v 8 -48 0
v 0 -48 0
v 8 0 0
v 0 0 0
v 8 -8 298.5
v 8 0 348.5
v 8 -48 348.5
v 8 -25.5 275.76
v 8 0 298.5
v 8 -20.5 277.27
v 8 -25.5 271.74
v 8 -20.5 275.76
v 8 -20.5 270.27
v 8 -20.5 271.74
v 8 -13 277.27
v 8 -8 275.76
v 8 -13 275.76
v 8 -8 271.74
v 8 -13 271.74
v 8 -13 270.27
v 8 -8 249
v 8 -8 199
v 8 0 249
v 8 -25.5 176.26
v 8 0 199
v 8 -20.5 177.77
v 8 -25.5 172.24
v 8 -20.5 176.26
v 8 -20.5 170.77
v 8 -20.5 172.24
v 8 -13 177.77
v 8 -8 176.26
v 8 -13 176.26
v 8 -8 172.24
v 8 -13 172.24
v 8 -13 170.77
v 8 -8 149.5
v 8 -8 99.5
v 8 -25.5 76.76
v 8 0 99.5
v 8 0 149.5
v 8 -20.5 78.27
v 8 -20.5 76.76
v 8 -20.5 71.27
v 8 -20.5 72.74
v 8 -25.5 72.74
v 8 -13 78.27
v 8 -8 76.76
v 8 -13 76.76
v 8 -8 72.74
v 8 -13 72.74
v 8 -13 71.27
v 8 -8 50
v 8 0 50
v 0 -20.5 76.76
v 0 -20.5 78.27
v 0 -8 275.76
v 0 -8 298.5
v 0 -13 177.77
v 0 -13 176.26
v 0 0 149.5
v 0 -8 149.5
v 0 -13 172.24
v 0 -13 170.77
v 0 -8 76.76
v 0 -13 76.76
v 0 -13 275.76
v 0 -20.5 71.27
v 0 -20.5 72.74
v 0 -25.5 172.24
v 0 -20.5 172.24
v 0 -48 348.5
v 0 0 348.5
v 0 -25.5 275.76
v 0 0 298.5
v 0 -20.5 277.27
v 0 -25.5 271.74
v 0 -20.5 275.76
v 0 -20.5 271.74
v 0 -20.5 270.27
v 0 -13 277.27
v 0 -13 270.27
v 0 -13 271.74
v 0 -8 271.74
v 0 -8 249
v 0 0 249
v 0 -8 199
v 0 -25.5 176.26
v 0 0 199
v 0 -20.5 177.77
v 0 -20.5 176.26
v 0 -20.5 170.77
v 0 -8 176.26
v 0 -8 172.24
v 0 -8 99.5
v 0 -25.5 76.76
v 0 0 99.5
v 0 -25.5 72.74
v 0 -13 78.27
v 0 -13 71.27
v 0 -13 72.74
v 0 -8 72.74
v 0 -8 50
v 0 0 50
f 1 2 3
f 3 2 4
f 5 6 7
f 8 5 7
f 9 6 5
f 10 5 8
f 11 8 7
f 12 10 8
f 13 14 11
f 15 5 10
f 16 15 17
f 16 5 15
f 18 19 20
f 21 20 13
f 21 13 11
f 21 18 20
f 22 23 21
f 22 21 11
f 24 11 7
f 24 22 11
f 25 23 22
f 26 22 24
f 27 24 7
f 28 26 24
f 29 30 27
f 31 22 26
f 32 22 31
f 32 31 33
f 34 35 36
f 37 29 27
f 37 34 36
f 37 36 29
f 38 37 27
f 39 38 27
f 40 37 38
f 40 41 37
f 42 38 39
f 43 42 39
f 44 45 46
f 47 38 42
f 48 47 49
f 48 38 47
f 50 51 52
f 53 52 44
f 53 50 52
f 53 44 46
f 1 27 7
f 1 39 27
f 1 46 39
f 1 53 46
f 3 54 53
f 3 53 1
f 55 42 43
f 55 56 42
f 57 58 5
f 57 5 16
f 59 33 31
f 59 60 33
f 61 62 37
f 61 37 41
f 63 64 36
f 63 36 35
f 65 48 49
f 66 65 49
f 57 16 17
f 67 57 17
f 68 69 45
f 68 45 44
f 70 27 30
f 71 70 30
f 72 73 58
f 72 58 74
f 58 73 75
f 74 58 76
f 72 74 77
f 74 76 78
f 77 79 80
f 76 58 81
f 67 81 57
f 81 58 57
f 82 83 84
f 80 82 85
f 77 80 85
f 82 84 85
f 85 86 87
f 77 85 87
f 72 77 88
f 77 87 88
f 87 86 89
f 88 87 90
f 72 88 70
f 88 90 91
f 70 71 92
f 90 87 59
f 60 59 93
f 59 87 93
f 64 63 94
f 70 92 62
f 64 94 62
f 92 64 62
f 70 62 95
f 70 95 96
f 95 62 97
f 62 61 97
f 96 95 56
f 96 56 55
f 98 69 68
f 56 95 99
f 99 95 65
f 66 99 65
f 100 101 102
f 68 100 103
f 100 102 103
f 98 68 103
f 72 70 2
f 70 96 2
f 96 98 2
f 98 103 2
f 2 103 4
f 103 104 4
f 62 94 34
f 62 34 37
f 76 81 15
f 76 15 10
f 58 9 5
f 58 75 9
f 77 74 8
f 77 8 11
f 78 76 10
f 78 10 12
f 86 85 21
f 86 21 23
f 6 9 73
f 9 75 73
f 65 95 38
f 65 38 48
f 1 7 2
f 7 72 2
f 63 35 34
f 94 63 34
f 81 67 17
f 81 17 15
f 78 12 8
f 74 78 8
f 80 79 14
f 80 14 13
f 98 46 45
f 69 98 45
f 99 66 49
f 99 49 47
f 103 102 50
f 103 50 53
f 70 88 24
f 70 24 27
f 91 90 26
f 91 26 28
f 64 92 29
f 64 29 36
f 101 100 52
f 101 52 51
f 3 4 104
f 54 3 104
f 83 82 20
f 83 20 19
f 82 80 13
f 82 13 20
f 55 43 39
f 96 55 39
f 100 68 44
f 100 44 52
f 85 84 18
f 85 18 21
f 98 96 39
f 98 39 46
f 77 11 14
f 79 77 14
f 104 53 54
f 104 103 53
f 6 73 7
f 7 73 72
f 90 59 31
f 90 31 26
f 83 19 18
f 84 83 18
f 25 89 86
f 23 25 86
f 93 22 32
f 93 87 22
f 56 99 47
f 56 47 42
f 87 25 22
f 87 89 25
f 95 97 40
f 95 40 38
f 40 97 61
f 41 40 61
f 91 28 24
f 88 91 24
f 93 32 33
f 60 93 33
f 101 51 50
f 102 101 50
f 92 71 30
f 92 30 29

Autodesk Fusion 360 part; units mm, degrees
sketch "Basic shape" plane through (0, 0, 0) normal (1, 0, 0) x (0, 0, -1)
  line L0 (0, 0) -> (-348.5, 0)
  line L1 (-348.5, 0) -> (-348.5, -48)
  line L2 (-348.5, -48) -> (0, -48)
  line L3 (0, -48) -> (0, 0)
  line L4 (-50, 0) -> (-99.5, 0)
  line L5 (-99.5, 0) -> (-99.5, -8)
  line L6 (-99.5, -8) -> (-50, -8)
  line L7 (-50, -8) -> (-50, 0)
  line L8 (-149.5, 0) -> (-199, 0)
  line L9 (-199, 0) -> (-199, -8)
  line L10 (-199, -8) -> (-149.5, -8)
  line L11 (-149.5, -8) -> (-149.5, 0)
  line L12 (-249, 0) -> (-298.5, 0)
  line L13 (-298.5, 0) -> (-298.5, -8)
  line L14 (-298.5, -8) -> (-249, -8)
  line L15 (-249, -8) -> (-249, 0)
  line L16 (-298.5, -8) -> (-348.5, -8) construction
  line L17 (-199, -8) -> (-249, -8) construction
  line L18 (-99.5, -8) -> (-149.5, -8) construction
  line L19 (-50, -8) -> (0, -8) construction
  dimension "d10" = 50
  dimension "d12" = 8
  dimension "d13" = 348.5
  dimension "d14" = 36.1667
  dimension "d246" = 40
extrude "Extrude1" add sketch "Basic shape" along normal blind 8 contours L0 L1 L2 L3 L5 L6 L7 L9 L10 L11 L13 L14 L15
sketch "T slots" plane through (0, 0, 0) normal (-1, 0, 0) x (0, 0, 1)
  line L0 (348.5, 0) -> (298.5, 0)
  line L1 (298.5, 0) -> (298.5, -8)
  line L2 (298.5, -8) -> (249, -8)
  line L3 (249, -8) -> (249, 0)
  line L4 (249, 0) -> (199, 0)
  line L5 (199, 0) -> (199, -8)
  line L6 (199, -8) -> (149.5, -8)
  line L7 (149.5, -8) -> (149.5, 0)
  line L8 (149.5, 0) -> (99.5, 0)
  line L9 (99.5, 0) -> (99.5, -8)
  line L10 (99.5, -8) -> (50, -8)
  line L11 (50, -8) -> (50, 0)
  line L12 (50, 0) -> (0, 0)
  line L13 (0, 0) -> (0, -48)
  line L14 (0, -48) -> (348.5, -48)
  line L15 (348.5, -48) -> (348.5, 0)
  line L16 (72.74, -8) -> (76.76, -8)
  line L17 (76.76, -8) -> (76.76, -25.5)
  line L18 (76.76, -25.5) -> (72.74, -25.5)
  line L19 (72.74, -25.5) -> (72.74, -8)
  line L20 (71.27, -13) -> (78.27, -13)
  line L21 (78.27, -13) -> (78.27, -20.5)
  line L22 (78.27, -20.5) -> (71.27, -20.5)
  line L23 (71.27, -20.5) -> (71.27, -13)
  line L24 (170.77, -20.5) -> (170.77, -13)
  line L25 (172.24, -8) -> (176.26, -8)
  line L26 (170.77, -13) -> (177.77, -13)
  line L27 (172.24, -25.5) -> (172.24, -8)
  line L28 (176.26, -8) -> (176.26, -25.5)
  line L29 (177.77, -20.5) -> (170.77, -20.5)
  line L30 (177.77, -13) -> (177.77, -20.5)
  line L31 (176.26, -25.5) -> (172.24, -25.5)
  line L32 (277.27, -20.5) -> (270.27, -20.5)
  line L33 (270.27, -13) -> (277.27, -13)
  line L34 (275.76, -8) -> (275.76, -25.5)
  line L35 (271.74, -25.5) -> (271.74, -8)
  line L36 (275.76, -25.5) -> (271.74, -25.5)
  line L37 (271.74, -8) -> (275.76, -8)
  line L38 (277.27, -13) -> (277.27, -20.5)
  line L39 (270.27, -20.5) -> (270.27, -13)
  circle A0 centre (275.27, -15) radius 2
  circle A1 centre (275.27, -18.5) radius 2
  dimension "d17" = 17.5
  dimension "d18" = 4.02
  dimension "d19" = 7
  dimension "d20" = 1.51
  dimension "d21" = 5
  dimension "d23" = 7.5
  dimension "d29" = 2.01
  dimension "d247" = 17.5
  dimension "d248" = 4.02
  dimension "d249" = 7
  dimension "d250" = 1.51
  dimension "d251" = 5
  dimension "d252" = 7.5
  dimension "d253" = 2.01
  dimension "d254" = 17.5
  dimension "d255" = 4.02
  dimension "d256" = 7
  dimension "d257" = 1.51
  dimension "d258" = 5
  dimension "d259" = 7.5
  dimension "d260" = 2.01
  dimension "d357" = 4
  dimension "d358" = 4
extrude "Extrude2" cut sketch "T slots" against normal through all contours L2 L33 L34 L35 L37 | L33 L34 A0 | L33 L34 L38 A0 | L32 L33 L35 L39 | L32 L33 L35 A0 A1 | L34 A0 A1 | L34 A0 A1 | L32 L34 L35 L36 | L34 A0 A1 | L34 A0 A1 | L38 A0 A1 | L34 A0 A1 | L10 L16 L17 L19 L20 | L32 L34 A1 | L34 A0 A1 | L32 L34 L38 A1 | L17 L19 L20 L22 | L19 L20 L22 L23 | L17 L20 L21 L22 | L17 L18 L19 L22 | L6 L25 L26 L27 L28 | L26 L27 L28 L29 | L26 L28 L29 L30 | L24 L26 L27 L29 | L27 L28 L29 L31
hole "Hole24" at (8, -6.5858, 297.0858) direction (-1, 0, 0) diameter 4 end up to surface (8 mm away)
hole "Hole25" at (8, -6.5858, 51.4142) direction (-1, 0, 0) diameter 4 end up to surface (8 mm away)
hole "Hole26" at (8, -6.5858, 98.0858) direction (-1, 0, 0) diameter 4 end up to surface (8 mm away)
hole "Hole27" at (8, -6.5858, 197.5858) direction (-1, 0, 0) diameter 4 end up to surface (8 mm away)
hole "Hole28" at (8, -6.5858, 250.4142) direction (-1, 0, 0) diameter 4 end up to surface (8 mm away)
hole "Hole29" at (8, -6.5858, 150.9142) direction (-1, 0, 0) diameter 4 end up to surface (8 mm away)
equation "d10 = Square_joint_thickness"
equation "pannel_thickness = 8 mm"
equation "d12 = pannel_thickness * 3 / 3"
equation "d15 = pannel_thickness"
equation "d20 = ( ( ( 7 - 4 ) / 2 ) * 1 mm ) + 0.01 mm"
equation "d250 = ( ( ( 7 - 4 ) / 2 ) * 1 mm ) + 0.01 mm"
equation "d257 = ( ( ( 7 - 4 ) / 2 ) * 1 mm ) + 0.01 mm"
equation "dbToolDia = 4 mm"
equation "dbOffset = 0 mm" comment "Do NOT change formula"
equation "dbRadius = ( dbToolDia + dbOffset ) / 2" comment "Do NOT change formula"
equation "dbMinPercent = 10"
equation "dbHoleOffset = dbRadius / sqrt(2)" comment "Do NOT change formula"
equation "d530 = dbRadius * 2"
equation "d532 = dbHoleOffset"
equation "d533 = dbHoleOffset"
equation "d535 = dbRadius * 2"
equation "d537 = dbHoleOffset"
equation "d538 = dbHoleOffset"
equation "d540 = dbRadius * 2"
equation "d542 = dbHoleOffset"
equation "d543 = dbHoleOffset"
equation "d545 = dbRadius * 2"
equation "d547 = dbHoleOffset"
equation "d548 = dbHoleOffset"
equation "d550 = dbRadius * 2"
equation "d552 = dbHoleOffset"
equation "d553 = dbHoleOffset"
equation "d555 = dbRadius * 2"
equation "d557 = dbHoleOffset"
equation "d558 = dbHoleOffset"
equation "Square_joint_thickness = 50 mm"
